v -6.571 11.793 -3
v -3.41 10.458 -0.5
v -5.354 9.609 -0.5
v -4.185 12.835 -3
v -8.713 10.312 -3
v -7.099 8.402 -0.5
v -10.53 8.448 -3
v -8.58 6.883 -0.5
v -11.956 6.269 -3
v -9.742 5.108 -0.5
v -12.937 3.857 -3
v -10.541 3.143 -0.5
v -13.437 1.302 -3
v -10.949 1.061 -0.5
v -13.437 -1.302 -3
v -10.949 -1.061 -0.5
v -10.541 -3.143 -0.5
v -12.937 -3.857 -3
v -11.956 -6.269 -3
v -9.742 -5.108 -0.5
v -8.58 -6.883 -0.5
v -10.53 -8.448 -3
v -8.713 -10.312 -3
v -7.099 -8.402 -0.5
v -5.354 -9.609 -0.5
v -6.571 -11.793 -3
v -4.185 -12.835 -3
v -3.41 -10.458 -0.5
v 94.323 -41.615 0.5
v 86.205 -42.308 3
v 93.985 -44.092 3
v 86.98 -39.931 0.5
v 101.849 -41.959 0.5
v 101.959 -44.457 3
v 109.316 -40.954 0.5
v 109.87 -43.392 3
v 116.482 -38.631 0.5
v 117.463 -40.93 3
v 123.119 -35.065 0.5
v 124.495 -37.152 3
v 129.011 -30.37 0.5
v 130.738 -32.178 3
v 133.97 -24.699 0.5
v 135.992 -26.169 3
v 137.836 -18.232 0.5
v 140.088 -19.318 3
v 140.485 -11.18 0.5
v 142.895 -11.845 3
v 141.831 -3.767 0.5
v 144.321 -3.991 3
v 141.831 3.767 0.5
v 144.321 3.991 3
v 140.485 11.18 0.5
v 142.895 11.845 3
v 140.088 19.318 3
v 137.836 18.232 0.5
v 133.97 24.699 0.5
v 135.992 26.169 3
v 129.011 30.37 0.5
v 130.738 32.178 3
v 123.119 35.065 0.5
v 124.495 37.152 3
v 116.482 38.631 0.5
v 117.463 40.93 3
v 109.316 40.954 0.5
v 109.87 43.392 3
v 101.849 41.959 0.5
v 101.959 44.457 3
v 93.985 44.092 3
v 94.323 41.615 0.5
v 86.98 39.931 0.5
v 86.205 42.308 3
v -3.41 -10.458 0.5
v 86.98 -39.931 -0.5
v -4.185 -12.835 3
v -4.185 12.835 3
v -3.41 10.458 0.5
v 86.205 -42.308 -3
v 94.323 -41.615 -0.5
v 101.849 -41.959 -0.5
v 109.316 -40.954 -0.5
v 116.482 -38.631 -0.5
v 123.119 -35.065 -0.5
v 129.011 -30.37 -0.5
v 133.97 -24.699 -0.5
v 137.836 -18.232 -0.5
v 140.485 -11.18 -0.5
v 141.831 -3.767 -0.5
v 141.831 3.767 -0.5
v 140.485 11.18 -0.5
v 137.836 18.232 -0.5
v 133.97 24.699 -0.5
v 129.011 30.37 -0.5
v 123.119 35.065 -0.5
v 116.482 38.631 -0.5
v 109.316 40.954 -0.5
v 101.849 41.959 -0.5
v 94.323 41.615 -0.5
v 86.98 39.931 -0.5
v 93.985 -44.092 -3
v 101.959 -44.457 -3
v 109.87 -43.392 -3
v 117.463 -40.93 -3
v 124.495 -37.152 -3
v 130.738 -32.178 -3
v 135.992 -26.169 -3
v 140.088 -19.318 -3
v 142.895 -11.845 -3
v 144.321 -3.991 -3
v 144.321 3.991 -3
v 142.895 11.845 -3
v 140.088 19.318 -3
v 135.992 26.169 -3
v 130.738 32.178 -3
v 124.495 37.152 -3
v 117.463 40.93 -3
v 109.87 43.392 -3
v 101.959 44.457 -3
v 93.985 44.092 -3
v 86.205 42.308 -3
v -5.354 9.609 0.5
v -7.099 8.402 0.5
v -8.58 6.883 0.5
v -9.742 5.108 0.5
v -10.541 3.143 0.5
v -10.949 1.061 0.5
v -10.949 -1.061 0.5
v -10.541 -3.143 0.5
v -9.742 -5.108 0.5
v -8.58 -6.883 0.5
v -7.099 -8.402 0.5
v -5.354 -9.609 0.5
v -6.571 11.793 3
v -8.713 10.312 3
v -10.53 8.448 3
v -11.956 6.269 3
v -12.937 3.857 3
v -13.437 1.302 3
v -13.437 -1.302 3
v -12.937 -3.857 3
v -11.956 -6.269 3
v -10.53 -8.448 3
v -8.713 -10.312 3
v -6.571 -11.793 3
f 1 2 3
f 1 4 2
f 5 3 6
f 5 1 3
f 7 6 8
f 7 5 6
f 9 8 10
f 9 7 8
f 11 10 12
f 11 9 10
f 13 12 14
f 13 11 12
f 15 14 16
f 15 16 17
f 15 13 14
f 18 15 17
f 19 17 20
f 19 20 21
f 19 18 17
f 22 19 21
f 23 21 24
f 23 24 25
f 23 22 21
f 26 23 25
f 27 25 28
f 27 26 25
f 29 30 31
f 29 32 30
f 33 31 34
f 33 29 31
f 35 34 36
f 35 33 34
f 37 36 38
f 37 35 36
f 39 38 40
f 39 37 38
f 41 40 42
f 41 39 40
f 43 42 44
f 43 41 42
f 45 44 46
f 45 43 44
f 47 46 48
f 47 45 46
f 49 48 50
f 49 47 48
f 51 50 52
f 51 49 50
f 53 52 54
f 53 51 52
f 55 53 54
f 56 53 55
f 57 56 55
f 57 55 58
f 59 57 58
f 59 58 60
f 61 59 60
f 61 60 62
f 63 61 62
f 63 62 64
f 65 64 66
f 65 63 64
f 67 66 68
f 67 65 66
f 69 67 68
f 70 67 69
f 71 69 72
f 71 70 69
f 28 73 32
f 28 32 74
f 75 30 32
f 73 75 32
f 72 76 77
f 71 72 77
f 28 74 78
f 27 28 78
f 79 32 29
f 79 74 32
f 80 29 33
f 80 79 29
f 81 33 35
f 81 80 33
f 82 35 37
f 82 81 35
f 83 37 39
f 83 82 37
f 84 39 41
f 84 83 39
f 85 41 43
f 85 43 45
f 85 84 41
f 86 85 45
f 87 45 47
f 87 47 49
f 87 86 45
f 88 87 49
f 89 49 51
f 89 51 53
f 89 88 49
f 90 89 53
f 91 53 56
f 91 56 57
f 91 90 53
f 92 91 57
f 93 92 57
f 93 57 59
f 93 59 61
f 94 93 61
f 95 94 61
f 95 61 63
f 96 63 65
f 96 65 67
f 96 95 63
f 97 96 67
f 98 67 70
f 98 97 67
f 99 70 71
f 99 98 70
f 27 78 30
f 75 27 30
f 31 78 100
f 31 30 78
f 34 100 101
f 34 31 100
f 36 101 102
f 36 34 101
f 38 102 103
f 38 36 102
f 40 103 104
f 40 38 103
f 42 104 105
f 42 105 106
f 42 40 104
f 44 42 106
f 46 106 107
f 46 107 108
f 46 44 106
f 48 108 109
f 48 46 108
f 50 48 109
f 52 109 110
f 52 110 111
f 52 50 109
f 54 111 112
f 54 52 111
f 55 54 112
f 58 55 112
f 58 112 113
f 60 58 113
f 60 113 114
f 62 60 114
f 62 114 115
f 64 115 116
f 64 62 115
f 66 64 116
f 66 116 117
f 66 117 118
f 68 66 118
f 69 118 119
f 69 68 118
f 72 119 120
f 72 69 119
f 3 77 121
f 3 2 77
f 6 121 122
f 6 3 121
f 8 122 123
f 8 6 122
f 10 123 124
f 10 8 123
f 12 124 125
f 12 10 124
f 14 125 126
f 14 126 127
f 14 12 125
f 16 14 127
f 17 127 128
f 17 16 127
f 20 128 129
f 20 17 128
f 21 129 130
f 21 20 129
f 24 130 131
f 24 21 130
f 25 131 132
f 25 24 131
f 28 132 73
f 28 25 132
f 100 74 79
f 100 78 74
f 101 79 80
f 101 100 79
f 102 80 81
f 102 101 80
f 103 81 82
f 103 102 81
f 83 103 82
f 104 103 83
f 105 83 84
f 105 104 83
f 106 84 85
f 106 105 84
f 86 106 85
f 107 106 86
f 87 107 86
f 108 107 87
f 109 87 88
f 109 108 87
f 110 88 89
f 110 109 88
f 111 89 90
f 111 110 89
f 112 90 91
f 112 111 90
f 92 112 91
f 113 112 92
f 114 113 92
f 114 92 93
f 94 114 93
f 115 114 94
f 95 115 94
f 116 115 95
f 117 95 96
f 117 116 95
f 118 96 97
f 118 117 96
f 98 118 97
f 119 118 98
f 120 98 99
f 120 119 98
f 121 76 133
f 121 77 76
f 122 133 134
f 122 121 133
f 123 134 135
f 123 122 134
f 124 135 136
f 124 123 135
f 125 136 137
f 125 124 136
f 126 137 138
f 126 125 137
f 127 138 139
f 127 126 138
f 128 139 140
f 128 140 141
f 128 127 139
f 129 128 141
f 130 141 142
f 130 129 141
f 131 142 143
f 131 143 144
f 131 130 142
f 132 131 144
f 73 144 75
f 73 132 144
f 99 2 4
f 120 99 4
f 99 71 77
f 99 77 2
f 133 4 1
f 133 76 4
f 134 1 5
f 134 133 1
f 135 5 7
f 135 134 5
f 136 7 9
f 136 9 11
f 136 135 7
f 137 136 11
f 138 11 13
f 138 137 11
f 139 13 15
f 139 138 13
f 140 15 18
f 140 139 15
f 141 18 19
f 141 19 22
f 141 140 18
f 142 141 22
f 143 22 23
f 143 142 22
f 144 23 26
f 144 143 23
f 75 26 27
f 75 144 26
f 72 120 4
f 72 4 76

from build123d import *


with BuildPart() as part:
    # Balayage1: sweep along a path in Esquisse1
    with BuildLine(Plane.XY) as balayage1_path:
        Line((86.98, 39.930935376), (-3.41, 10.458102122))
        ThreePointArc((-3.41, 10.458102122), (-11, 0), (-3.41, -10.458102122))
        Line((-3.41, -10.458102122), (86.98, -39.930935376))
        ThreePointArc((86.98, -39.930935376), (142, 0), (86.98, 39.930935376))
    # Esquisse2 → Balayage1 (sweep)
    with BuildSketch(Plane(origin=(0, 0, 0), x_dir=(1, 0, 0), z_dir=(0, 1, 0))):
        Polygon((-13.5, -3), (-13.5, 3), (-11, 0.5), (-11, -0.5), align=None)
    sweep(path=balayage1_path.line)


solid = part.part
